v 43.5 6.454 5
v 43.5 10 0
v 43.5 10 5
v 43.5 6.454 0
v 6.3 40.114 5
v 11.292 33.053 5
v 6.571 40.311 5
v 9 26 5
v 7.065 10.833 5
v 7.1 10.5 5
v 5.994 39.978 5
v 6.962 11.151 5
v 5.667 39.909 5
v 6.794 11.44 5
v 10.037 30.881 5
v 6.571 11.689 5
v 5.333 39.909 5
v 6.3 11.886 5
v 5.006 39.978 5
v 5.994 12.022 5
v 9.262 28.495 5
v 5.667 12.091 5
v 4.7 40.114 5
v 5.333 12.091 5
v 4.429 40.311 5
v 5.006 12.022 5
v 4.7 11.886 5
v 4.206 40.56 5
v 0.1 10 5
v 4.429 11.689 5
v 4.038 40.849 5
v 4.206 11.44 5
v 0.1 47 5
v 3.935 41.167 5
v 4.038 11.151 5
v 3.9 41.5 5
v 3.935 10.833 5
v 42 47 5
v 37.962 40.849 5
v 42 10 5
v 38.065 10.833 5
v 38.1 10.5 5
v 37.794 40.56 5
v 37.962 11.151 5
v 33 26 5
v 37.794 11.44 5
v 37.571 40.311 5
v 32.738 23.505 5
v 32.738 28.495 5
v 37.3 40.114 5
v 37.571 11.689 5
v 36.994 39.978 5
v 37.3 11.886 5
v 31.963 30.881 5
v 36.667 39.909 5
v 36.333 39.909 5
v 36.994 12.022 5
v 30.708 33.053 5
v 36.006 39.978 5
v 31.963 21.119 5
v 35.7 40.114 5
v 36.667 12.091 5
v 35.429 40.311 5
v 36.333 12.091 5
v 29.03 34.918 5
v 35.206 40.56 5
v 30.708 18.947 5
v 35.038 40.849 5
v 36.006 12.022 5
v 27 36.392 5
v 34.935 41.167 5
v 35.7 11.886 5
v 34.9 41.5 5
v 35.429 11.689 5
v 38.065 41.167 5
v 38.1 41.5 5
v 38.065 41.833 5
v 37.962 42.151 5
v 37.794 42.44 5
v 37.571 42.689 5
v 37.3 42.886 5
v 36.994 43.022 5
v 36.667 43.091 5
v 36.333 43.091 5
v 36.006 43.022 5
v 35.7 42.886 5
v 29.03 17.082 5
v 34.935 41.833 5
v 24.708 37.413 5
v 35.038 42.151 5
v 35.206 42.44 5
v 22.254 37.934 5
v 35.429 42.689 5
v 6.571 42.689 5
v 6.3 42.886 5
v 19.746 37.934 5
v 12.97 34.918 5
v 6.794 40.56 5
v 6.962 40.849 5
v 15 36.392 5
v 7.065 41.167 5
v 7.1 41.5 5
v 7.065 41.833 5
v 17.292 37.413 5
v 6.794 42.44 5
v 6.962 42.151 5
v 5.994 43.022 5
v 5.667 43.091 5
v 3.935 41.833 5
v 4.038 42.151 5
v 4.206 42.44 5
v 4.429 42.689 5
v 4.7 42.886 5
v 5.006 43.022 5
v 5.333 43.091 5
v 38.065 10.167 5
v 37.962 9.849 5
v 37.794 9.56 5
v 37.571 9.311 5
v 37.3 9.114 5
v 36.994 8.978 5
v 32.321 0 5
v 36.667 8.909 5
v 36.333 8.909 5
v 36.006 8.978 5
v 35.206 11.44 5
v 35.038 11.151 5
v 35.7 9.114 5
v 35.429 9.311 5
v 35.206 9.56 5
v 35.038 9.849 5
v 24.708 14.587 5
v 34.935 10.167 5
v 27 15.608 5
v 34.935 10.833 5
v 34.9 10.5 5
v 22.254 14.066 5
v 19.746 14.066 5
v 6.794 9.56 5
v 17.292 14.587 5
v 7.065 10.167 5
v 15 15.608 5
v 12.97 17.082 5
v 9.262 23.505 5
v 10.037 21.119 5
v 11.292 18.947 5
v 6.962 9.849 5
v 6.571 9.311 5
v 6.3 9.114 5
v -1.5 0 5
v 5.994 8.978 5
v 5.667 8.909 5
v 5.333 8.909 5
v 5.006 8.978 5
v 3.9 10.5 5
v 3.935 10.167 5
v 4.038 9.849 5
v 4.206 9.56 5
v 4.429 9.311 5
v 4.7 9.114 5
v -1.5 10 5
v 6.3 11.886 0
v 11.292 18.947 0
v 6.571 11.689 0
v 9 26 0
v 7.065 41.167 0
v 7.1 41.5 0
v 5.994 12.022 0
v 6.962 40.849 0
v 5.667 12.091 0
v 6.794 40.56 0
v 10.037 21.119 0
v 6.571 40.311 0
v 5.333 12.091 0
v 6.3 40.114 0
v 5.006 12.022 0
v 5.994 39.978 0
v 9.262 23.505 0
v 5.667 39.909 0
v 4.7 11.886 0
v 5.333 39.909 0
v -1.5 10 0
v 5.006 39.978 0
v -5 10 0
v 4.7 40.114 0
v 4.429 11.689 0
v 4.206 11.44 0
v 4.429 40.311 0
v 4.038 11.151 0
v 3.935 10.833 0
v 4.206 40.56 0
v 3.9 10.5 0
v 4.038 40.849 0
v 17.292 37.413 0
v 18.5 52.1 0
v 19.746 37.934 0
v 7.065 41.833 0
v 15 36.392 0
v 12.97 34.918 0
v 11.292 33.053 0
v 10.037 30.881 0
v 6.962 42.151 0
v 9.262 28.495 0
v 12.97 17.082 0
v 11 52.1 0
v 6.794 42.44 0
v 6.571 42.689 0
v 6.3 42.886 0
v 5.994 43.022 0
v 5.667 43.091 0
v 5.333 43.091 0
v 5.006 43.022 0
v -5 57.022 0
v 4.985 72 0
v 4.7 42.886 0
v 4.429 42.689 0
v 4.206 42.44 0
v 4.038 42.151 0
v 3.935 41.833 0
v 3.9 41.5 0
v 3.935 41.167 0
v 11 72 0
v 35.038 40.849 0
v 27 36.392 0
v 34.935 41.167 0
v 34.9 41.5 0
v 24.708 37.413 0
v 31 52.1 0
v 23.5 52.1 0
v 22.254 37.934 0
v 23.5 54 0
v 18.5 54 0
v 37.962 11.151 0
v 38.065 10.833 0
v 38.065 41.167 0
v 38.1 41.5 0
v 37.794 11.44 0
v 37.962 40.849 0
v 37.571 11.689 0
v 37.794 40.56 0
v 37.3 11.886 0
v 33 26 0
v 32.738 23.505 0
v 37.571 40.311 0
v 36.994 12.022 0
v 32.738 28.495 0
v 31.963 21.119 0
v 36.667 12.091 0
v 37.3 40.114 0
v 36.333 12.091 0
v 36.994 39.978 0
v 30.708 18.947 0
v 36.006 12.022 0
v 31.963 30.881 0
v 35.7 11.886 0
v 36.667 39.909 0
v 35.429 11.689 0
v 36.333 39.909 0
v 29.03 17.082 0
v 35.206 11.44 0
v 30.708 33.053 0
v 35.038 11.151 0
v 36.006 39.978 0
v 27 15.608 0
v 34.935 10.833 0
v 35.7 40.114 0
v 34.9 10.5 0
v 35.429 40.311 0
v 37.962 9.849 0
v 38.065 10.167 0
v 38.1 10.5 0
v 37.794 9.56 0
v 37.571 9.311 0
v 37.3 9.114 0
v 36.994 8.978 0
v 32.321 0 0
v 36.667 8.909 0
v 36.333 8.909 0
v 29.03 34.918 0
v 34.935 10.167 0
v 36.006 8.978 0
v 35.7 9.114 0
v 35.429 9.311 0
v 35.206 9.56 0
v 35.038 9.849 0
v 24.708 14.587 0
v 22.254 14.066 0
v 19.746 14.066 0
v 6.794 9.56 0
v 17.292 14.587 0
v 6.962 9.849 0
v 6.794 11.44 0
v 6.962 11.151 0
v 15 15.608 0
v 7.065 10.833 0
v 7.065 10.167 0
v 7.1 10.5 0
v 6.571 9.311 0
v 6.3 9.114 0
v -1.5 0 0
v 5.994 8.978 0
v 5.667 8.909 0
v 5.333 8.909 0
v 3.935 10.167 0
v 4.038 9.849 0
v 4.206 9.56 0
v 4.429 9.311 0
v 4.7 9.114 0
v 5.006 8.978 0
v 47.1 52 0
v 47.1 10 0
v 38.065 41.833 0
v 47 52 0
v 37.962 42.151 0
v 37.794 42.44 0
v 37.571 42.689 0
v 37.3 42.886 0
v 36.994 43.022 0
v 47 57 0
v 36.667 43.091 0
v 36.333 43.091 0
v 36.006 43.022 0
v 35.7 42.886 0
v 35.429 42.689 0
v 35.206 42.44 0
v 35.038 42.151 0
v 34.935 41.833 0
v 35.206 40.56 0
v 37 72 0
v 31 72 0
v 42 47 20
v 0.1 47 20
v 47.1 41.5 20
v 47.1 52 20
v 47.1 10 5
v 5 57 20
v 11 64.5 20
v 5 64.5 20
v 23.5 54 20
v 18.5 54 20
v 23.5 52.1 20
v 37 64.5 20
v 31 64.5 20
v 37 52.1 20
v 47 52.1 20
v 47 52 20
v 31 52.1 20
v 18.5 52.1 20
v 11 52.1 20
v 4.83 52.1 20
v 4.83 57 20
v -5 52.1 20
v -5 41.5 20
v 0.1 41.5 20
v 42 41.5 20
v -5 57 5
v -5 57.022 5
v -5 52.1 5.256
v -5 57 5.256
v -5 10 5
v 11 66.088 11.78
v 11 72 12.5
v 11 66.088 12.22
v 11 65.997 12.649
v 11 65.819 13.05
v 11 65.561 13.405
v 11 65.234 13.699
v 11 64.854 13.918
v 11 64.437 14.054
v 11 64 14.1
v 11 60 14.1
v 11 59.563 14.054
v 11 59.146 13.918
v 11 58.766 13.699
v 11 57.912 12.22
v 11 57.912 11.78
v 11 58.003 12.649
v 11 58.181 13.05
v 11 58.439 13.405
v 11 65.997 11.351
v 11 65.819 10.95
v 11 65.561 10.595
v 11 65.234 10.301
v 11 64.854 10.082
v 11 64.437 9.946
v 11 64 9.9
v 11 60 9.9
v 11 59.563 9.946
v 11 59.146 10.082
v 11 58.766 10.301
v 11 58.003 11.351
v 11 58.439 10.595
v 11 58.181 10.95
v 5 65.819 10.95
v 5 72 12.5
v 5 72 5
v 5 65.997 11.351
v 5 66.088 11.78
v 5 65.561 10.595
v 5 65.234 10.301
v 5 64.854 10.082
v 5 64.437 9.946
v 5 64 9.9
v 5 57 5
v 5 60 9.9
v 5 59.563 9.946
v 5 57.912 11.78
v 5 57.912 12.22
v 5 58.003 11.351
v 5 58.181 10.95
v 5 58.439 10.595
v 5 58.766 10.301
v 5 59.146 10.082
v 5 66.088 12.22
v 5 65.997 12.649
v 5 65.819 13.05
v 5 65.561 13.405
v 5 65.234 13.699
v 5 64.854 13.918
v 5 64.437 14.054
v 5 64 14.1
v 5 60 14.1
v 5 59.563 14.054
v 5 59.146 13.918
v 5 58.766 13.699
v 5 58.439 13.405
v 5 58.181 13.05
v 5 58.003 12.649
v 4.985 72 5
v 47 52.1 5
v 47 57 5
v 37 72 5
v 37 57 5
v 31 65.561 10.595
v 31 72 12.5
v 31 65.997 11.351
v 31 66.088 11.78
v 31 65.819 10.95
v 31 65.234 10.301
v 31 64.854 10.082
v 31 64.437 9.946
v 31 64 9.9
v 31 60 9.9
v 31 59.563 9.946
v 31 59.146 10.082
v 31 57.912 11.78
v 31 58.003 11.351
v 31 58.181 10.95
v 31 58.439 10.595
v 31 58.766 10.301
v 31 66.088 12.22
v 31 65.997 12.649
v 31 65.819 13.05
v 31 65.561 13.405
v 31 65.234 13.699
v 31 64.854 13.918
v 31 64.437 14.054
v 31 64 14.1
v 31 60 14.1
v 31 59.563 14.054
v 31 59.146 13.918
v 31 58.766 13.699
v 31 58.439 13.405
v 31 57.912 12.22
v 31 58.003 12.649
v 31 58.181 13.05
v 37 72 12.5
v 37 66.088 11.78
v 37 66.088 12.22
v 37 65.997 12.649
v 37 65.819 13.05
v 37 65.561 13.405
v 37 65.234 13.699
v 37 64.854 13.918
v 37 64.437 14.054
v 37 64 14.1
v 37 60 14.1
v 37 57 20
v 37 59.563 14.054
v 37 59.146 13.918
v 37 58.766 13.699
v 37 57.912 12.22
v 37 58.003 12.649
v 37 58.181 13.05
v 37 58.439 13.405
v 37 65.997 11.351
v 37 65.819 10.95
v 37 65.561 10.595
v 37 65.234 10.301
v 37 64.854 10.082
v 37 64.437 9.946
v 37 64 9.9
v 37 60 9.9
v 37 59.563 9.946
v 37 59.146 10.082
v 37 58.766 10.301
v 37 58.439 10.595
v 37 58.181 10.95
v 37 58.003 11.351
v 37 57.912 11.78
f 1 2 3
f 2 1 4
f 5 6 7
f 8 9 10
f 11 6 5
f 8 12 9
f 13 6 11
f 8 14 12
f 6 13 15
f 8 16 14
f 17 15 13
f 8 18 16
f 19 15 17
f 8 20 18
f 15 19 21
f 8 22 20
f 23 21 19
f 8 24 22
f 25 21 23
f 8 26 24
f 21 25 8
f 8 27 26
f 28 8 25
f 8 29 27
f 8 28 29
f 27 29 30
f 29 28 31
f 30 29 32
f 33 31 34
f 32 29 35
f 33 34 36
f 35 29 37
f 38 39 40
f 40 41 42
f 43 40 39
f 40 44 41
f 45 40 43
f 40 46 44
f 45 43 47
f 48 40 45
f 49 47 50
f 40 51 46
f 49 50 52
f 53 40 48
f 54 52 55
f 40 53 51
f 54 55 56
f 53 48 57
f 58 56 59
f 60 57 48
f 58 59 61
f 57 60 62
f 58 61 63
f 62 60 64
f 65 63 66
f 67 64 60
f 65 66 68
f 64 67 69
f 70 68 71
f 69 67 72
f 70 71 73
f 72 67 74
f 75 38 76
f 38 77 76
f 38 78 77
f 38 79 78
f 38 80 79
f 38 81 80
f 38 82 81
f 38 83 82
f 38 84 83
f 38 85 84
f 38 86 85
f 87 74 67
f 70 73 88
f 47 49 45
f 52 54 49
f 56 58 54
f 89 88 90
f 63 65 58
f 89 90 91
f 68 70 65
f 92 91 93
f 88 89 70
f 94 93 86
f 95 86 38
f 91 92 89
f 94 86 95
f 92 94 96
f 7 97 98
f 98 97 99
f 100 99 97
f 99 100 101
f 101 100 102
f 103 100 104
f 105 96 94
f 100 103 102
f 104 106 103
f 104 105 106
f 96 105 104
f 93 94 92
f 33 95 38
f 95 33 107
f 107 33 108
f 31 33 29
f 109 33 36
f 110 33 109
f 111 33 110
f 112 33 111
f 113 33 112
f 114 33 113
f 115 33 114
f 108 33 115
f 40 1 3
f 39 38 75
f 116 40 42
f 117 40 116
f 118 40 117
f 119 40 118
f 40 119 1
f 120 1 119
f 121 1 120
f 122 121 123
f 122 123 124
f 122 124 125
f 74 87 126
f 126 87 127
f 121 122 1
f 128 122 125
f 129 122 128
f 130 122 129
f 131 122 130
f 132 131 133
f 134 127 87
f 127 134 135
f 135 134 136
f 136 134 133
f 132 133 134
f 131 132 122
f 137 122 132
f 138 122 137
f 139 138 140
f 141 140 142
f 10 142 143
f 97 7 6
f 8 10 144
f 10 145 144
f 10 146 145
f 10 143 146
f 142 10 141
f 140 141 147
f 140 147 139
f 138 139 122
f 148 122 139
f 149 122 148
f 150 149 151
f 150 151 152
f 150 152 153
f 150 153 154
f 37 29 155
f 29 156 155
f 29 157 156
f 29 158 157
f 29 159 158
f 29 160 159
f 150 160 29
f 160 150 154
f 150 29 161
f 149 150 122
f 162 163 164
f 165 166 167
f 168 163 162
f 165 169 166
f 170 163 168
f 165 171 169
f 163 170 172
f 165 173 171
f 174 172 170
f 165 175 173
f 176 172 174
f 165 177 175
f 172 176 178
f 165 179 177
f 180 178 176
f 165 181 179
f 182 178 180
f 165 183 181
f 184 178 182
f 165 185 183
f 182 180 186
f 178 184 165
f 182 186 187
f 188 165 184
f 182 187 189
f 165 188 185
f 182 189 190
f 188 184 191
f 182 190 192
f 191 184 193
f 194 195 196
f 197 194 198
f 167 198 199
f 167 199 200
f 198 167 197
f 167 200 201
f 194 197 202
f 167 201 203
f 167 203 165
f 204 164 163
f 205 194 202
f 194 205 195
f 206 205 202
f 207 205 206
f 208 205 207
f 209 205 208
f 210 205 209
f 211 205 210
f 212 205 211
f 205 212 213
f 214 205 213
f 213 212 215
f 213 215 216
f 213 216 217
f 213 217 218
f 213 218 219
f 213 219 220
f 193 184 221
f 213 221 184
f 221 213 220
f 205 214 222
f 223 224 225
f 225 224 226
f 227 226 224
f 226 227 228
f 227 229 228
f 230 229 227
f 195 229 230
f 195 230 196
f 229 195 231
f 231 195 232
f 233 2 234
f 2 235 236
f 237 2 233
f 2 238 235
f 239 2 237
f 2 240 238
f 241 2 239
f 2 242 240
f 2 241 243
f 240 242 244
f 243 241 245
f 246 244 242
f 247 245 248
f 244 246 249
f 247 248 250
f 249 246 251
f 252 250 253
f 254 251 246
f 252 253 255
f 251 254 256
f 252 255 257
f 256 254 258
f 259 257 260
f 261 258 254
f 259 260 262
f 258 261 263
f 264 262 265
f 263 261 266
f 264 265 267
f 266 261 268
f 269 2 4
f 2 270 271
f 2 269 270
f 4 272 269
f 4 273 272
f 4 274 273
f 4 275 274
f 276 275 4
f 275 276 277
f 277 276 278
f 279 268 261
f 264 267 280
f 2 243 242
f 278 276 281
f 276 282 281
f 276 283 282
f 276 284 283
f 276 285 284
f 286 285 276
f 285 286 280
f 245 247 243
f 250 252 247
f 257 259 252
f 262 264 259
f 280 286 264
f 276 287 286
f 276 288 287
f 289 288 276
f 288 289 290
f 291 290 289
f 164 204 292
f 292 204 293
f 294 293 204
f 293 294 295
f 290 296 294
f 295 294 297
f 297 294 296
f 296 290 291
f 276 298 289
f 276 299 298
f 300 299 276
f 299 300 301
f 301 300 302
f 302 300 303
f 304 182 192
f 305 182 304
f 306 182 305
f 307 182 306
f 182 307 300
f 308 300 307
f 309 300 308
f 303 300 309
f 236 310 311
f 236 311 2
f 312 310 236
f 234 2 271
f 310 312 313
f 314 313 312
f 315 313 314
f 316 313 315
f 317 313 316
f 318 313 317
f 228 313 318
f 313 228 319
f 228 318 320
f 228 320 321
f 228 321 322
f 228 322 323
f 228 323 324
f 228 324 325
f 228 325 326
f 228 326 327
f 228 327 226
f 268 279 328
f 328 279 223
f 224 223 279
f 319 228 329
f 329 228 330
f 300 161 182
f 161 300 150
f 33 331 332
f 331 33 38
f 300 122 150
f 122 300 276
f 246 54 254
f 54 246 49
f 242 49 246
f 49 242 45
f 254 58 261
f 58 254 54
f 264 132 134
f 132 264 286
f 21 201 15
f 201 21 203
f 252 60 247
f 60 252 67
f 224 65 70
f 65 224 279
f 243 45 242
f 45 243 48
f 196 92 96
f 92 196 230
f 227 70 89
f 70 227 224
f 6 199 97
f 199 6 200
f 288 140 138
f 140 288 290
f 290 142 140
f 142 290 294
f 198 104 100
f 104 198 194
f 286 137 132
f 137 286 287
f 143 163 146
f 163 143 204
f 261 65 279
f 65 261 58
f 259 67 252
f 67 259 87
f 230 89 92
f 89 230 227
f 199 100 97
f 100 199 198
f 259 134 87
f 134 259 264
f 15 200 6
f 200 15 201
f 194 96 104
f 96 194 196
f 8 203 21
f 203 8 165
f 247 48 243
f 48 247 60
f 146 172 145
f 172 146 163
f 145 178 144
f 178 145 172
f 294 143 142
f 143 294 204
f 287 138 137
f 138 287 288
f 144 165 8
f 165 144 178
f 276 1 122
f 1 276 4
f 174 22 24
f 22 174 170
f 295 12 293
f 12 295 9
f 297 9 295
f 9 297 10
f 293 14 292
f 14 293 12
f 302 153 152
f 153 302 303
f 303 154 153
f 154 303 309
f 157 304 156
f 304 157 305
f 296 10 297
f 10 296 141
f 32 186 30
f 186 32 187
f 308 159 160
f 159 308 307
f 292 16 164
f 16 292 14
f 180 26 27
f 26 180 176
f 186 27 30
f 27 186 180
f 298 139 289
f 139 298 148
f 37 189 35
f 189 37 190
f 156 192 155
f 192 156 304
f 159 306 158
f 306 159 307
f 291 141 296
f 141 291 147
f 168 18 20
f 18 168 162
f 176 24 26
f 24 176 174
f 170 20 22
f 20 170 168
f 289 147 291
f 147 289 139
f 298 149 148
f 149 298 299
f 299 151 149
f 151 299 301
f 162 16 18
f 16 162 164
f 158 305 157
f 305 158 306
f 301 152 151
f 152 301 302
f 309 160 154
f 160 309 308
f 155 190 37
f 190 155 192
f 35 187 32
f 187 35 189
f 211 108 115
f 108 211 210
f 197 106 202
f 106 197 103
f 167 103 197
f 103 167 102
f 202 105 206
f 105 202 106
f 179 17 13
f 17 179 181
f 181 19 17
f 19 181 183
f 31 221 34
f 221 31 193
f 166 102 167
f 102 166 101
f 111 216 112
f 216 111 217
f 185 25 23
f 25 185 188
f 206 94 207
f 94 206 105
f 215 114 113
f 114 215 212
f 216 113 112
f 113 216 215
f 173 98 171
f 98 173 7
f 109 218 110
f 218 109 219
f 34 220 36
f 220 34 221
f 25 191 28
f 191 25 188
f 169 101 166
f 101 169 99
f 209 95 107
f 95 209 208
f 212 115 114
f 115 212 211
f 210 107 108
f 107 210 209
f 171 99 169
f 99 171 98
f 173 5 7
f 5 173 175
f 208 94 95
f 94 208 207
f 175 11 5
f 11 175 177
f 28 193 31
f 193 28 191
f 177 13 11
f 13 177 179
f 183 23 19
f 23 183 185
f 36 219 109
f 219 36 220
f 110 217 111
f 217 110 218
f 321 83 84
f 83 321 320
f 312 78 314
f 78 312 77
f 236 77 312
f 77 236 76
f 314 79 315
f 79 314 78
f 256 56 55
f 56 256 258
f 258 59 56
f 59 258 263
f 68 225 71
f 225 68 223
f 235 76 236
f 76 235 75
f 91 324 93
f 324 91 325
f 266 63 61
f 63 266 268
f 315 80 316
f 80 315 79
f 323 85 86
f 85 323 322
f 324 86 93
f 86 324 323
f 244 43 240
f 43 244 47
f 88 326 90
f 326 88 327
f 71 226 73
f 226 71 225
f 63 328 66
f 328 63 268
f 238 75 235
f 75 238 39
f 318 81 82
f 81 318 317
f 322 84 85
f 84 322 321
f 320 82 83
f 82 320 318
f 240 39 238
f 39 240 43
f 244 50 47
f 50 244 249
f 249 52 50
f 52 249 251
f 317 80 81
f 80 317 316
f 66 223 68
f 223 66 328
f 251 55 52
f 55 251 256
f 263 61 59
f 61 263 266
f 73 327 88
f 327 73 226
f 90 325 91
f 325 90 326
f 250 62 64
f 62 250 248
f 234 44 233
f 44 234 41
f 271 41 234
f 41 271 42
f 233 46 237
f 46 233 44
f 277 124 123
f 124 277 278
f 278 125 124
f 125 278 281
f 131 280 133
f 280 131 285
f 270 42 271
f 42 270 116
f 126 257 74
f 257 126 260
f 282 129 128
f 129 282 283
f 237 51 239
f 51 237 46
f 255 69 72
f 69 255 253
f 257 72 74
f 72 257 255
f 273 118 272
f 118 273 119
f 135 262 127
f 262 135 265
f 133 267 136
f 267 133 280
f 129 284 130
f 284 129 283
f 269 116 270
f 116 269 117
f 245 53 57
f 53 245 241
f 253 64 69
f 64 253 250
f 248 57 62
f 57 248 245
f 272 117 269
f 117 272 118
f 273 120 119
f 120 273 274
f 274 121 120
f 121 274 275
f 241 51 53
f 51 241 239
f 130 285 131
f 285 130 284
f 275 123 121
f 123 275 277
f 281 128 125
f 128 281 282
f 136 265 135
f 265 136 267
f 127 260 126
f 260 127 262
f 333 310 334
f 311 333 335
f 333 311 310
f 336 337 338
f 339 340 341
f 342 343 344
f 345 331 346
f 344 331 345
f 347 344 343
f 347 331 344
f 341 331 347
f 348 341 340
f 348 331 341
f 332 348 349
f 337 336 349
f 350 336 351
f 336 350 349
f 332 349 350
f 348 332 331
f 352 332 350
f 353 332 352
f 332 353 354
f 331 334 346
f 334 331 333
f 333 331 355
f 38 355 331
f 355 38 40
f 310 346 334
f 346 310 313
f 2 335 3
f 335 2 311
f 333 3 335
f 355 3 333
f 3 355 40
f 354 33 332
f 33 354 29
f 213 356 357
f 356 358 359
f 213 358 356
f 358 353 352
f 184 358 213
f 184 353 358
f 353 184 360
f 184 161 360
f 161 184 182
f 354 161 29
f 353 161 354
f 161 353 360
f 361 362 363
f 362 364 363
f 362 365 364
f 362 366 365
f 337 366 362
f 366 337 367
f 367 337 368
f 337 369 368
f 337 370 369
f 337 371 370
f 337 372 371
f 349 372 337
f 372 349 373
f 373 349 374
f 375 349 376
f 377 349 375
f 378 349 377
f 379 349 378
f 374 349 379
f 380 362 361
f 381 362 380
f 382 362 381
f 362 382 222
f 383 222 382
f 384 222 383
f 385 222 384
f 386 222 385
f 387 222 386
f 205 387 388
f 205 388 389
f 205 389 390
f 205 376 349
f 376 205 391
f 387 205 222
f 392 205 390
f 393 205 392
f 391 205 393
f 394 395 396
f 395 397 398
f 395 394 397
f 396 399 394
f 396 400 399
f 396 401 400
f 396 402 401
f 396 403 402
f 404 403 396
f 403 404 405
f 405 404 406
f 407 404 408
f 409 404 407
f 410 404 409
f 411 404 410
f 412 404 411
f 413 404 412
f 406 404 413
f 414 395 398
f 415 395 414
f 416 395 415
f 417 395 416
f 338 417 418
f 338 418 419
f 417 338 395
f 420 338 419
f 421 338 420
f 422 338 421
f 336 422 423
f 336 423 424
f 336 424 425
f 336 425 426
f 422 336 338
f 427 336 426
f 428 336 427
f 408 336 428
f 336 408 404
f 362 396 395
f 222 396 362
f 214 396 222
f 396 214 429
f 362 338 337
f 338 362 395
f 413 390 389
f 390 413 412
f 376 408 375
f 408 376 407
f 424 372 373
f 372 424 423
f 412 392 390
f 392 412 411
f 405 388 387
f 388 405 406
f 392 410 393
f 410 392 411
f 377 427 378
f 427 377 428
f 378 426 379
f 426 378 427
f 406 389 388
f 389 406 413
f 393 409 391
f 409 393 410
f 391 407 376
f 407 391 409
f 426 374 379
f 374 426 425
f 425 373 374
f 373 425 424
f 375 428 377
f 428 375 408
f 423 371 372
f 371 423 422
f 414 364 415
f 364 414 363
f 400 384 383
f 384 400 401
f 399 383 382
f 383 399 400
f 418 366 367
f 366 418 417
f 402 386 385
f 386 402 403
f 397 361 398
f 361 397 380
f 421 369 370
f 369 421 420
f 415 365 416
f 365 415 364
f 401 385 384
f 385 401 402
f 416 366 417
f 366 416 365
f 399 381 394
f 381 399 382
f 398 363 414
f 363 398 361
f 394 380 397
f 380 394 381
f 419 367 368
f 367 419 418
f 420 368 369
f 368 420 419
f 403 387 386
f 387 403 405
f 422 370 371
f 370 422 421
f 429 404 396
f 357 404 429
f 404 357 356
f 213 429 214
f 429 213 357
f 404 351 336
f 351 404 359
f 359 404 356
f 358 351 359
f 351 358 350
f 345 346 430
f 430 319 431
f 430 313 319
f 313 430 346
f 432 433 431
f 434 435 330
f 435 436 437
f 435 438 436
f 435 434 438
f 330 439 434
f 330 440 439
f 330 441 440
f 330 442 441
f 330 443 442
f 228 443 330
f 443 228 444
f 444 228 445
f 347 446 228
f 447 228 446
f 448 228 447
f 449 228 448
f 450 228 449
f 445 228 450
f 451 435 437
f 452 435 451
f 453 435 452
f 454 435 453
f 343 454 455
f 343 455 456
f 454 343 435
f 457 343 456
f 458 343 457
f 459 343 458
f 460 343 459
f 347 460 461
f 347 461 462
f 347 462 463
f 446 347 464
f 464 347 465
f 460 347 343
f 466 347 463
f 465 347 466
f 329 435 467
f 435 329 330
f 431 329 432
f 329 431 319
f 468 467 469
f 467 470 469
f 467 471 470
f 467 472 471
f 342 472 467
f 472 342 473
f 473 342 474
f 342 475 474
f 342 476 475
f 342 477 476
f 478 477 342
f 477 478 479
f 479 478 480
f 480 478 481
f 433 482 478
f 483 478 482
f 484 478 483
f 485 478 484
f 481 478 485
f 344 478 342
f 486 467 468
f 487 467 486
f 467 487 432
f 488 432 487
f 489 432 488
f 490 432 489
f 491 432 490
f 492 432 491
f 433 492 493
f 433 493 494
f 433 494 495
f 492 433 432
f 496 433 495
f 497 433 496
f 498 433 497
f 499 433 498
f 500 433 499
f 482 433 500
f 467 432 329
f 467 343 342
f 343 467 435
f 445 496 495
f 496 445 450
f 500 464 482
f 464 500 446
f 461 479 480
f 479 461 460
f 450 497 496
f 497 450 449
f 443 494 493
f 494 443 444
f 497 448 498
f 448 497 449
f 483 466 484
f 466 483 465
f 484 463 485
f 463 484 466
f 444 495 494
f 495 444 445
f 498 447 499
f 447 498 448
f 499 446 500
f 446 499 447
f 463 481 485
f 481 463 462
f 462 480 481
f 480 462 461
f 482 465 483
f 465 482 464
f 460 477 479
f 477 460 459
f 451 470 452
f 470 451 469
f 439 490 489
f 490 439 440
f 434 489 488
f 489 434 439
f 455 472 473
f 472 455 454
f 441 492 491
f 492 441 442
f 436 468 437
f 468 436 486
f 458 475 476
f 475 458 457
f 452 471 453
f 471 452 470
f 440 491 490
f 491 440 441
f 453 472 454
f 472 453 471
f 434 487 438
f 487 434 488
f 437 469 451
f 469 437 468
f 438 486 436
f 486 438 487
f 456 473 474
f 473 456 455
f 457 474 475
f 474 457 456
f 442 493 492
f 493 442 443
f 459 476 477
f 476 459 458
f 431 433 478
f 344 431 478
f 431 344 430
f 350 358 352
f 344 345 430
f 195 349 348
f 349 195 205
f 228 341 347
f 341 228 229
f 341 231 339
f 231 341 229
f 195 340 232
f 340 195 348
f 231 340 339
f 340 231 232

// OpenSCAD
// file: metric.scad
// PRUSA Mendel  
// Default metric sizes
// GNU GPL v2
// Josef Průša
// josefprusa@me.com
// prusadjs.cz
// http://www.reprap.org/wiki/Prusa_Mendel
// http://github.com/prusajr/PrusaMendel

// DONT CHANGE THIS FILE! ALTER VALUES IN CONFIGURATION.SCAD INSTEAD

// RODS

threaded_rod_diameter = 8;
threaded_rod_diameter_horizontal = 8;
smooth_bar_diameter = 8;
smooth_bar_diameter_horizontal = 8;

// Nuts and bolts

m8_diameter = 8;
m8_nut_diameter = 14.5;

m4_diameter = 4;
m4_nut_diameter = 7.5;

m3_diameter = 3;
m3_nut_diameter = 5;

// Bushing holder

bushing_core_diameter = smooth_bar_diameter;
bushing_material_thickness = 1;

// Motors

motor_shaft = 5.1;
// main file
// C. Strang		
// cstrang@????
// funfor.us
// f. beachler
// longevity software d.b.a. terawatt industries

include <metric.scad>;

h = 5;   	// base thickness
hh=6;
o = 0.1;	//  overlap amount
w=2.5;			// wall thickness
fmp = true;	// four mount points
st=2;

m3=m3_diameter + 0.2; 
m4=m4_diameter + 0.2; 
m8 = smooth_bar_diameter_horizontal;

$fn=30;

translate([0,0,0]) ymotormount();

module ymotormount()
{
	translate([0, 5, 0]) rotate([0, 0, 0]) nema17motormount(h,fmp);
	translate([0, 10, 0]) rotate([0,0,0]) walls();
}


module nema17motormount(pt, mp)
{
	difference()
	{
		union()
		{
			difference()
			{
				translate([-1.5, -5, 0]) rotate([0,0,0]) cube([42 + 3, 47, pt]);
		
				translate([21,21,-0.1]) cylinder(r=12,h=pt+2*o);
				if (mp==false)
				{
					translate([28,-0.1,-o])  cube([25,30,21]);
					translate([3,-0.1,-o])  cube([36,15,21]);
				} else {
					translate([55, -15, -o]) rotate([0, 0, 120]) cube([20, 20, 10]);
				}
		
			}
			
			if (mp==false) difference()
			{
				translate([35.6,32.6,0]) cylinder(r=7.3,h=pt);
				translate([42,28,-o]) cube([5,10,pt+2*o]);
				translate([28,30,-o]) cube([17,10,pt+2*o]);
			}
		
			if (mp==false) translate([1,0,0]) difference()
			{
				translate([2.6,9.3,0]) cylinder(r=9.3,h=pt);
				translate([-8,0,-o]) cube([7,20,pt+2*o]);
			}
		}
		translate([5.5,5.5,-o]) cylinder(r=m3/2,h=pt+2*o);
		translate([5.5,36.5,-o]) cylinder(r=m3/2,h=pt+2*o);
		translate([36.5,36.5,-o]) cylinder(r=m3/2,h=pt+2*o);
		if (mp==true)
		{
			translate([36.5,5.5,-o]) cylinder(r=m3/2,h=pt+2*o);
	
		}
	}
}


module walls()
{
	// fill-in space between bottom wall and nema mount
	//translate([0,0,0]) rotate([0,0,0]) cube([30, 42, 5]);
	// nema mount wall
	difference()
	{
			translate([42, 0, 0]) rotate([0,0,0]) cube([h+o, 42, 20]);
			translate([-o + 42, 0, h]) rotate([atan(20/42),0,0]) cube([h+3*o, 47, 25]);
	}
	// support between bottom and nema mount walls
	translate([47, 37, 0]) rotate([0, 0, 90]) cube([h + o, 52,20]);
	// bottom wall
	difference()
	{
			translate([-5, 0, 0]) rotate([0,0,0]) cube([h+o, 42, 20]);
			translate([-o - 5, 0, h]) rotate([atan(20/42),0,0]) cube([h+3*o, 47, 25]);
	}
	// extrusion wall
	difference()
	{
			translate([h,42,0]) rotate([0,0,0]) cube([hh,20,20]);
			translate([h - o, 62, 12.5]) rotate([atan(1),0,0]) cube([hh+2*o,20,25]);
			// m4 screw slot
			translate([h - o, 50, 12]) rotate([0,90,0]) cylinder(r = m4 / 2 , h = hh * 2 + 2*o);
			translate([h - o, 54, 12]) rotate([0,90,0]) cylinder(r = m4 / 2 , h = hh * 2 + 2*o);
			translate([h - o, 50, 12 + m4 / 2]) rotate([0,90,0]) cube([m4,4,10]);
	}
	// extrusion wall support
	difference()
	{
			translate([-h, 42, 0]) rotate([0,0,0]) cube([16,20,h]);
			translate([-h - 8.7, 52, -o]) rotate([0,0,-atan(10/15)]) mirror([0,0,0]) cube([10,20,h+3*o]);
	}
	difference()
	{
			translate([-h, 42, 0]) rotate([0, 0, 0]) cube([16, h, 20]);
			translate([-h - 14, 42 - o, h + 8 + o]) rotate([0, atan(10/15), 0]) mirror([0,0,0]) cube([16,h+3*o,20]);
	}
	// extrusion wall support
	difference()
	{
			translate([31,42,0]) rotate([0,0,0]) cube([16,20,h]);
			translate([47,47,-o]) rotate([0,0,atan(10/15)]) mirror([0,0,0]) cube([10,20,h+3*o]);
	}
	// extrusion wall
	difference()
	{
			translate([31,42,0]) rotate([0,0,0]) cube([hh,20,20]);
			translate([31-o,62,12.5]) rotate([atan(1),0,0]) cube([hh+2*o,20,25]);
			// m4 screw slot
			translate([31 - o, 50, 12]) rotate([0,90,0]) cylinder(r = m4 / 2, h = hh * 2 + 2*o);
			translate([31 - o, 54, 12]) rotate([0,90,0]) cylinder(r = m4 / 2, h = hh * 2 + 2*o);
			translate([31 - o, 50, 12 + m4 / 2]) rotate([0,90,0]) cube([m4,4,10]);
	}
	// extrusion wall support
	difference()
	{
			translate([31,42,0]) rotate([0,0,0]) cube([16,h,20]);
			translate([47,42-o,h]) rotate([0,-atan(10/15),0]) mirror([0,0,0]) cube([16,h+3*o,20]);
	}
	// t-slot guide
	translate([18.5,42,0]) rotate([0,0,0]) cube([5, st, h + 15]);
}
